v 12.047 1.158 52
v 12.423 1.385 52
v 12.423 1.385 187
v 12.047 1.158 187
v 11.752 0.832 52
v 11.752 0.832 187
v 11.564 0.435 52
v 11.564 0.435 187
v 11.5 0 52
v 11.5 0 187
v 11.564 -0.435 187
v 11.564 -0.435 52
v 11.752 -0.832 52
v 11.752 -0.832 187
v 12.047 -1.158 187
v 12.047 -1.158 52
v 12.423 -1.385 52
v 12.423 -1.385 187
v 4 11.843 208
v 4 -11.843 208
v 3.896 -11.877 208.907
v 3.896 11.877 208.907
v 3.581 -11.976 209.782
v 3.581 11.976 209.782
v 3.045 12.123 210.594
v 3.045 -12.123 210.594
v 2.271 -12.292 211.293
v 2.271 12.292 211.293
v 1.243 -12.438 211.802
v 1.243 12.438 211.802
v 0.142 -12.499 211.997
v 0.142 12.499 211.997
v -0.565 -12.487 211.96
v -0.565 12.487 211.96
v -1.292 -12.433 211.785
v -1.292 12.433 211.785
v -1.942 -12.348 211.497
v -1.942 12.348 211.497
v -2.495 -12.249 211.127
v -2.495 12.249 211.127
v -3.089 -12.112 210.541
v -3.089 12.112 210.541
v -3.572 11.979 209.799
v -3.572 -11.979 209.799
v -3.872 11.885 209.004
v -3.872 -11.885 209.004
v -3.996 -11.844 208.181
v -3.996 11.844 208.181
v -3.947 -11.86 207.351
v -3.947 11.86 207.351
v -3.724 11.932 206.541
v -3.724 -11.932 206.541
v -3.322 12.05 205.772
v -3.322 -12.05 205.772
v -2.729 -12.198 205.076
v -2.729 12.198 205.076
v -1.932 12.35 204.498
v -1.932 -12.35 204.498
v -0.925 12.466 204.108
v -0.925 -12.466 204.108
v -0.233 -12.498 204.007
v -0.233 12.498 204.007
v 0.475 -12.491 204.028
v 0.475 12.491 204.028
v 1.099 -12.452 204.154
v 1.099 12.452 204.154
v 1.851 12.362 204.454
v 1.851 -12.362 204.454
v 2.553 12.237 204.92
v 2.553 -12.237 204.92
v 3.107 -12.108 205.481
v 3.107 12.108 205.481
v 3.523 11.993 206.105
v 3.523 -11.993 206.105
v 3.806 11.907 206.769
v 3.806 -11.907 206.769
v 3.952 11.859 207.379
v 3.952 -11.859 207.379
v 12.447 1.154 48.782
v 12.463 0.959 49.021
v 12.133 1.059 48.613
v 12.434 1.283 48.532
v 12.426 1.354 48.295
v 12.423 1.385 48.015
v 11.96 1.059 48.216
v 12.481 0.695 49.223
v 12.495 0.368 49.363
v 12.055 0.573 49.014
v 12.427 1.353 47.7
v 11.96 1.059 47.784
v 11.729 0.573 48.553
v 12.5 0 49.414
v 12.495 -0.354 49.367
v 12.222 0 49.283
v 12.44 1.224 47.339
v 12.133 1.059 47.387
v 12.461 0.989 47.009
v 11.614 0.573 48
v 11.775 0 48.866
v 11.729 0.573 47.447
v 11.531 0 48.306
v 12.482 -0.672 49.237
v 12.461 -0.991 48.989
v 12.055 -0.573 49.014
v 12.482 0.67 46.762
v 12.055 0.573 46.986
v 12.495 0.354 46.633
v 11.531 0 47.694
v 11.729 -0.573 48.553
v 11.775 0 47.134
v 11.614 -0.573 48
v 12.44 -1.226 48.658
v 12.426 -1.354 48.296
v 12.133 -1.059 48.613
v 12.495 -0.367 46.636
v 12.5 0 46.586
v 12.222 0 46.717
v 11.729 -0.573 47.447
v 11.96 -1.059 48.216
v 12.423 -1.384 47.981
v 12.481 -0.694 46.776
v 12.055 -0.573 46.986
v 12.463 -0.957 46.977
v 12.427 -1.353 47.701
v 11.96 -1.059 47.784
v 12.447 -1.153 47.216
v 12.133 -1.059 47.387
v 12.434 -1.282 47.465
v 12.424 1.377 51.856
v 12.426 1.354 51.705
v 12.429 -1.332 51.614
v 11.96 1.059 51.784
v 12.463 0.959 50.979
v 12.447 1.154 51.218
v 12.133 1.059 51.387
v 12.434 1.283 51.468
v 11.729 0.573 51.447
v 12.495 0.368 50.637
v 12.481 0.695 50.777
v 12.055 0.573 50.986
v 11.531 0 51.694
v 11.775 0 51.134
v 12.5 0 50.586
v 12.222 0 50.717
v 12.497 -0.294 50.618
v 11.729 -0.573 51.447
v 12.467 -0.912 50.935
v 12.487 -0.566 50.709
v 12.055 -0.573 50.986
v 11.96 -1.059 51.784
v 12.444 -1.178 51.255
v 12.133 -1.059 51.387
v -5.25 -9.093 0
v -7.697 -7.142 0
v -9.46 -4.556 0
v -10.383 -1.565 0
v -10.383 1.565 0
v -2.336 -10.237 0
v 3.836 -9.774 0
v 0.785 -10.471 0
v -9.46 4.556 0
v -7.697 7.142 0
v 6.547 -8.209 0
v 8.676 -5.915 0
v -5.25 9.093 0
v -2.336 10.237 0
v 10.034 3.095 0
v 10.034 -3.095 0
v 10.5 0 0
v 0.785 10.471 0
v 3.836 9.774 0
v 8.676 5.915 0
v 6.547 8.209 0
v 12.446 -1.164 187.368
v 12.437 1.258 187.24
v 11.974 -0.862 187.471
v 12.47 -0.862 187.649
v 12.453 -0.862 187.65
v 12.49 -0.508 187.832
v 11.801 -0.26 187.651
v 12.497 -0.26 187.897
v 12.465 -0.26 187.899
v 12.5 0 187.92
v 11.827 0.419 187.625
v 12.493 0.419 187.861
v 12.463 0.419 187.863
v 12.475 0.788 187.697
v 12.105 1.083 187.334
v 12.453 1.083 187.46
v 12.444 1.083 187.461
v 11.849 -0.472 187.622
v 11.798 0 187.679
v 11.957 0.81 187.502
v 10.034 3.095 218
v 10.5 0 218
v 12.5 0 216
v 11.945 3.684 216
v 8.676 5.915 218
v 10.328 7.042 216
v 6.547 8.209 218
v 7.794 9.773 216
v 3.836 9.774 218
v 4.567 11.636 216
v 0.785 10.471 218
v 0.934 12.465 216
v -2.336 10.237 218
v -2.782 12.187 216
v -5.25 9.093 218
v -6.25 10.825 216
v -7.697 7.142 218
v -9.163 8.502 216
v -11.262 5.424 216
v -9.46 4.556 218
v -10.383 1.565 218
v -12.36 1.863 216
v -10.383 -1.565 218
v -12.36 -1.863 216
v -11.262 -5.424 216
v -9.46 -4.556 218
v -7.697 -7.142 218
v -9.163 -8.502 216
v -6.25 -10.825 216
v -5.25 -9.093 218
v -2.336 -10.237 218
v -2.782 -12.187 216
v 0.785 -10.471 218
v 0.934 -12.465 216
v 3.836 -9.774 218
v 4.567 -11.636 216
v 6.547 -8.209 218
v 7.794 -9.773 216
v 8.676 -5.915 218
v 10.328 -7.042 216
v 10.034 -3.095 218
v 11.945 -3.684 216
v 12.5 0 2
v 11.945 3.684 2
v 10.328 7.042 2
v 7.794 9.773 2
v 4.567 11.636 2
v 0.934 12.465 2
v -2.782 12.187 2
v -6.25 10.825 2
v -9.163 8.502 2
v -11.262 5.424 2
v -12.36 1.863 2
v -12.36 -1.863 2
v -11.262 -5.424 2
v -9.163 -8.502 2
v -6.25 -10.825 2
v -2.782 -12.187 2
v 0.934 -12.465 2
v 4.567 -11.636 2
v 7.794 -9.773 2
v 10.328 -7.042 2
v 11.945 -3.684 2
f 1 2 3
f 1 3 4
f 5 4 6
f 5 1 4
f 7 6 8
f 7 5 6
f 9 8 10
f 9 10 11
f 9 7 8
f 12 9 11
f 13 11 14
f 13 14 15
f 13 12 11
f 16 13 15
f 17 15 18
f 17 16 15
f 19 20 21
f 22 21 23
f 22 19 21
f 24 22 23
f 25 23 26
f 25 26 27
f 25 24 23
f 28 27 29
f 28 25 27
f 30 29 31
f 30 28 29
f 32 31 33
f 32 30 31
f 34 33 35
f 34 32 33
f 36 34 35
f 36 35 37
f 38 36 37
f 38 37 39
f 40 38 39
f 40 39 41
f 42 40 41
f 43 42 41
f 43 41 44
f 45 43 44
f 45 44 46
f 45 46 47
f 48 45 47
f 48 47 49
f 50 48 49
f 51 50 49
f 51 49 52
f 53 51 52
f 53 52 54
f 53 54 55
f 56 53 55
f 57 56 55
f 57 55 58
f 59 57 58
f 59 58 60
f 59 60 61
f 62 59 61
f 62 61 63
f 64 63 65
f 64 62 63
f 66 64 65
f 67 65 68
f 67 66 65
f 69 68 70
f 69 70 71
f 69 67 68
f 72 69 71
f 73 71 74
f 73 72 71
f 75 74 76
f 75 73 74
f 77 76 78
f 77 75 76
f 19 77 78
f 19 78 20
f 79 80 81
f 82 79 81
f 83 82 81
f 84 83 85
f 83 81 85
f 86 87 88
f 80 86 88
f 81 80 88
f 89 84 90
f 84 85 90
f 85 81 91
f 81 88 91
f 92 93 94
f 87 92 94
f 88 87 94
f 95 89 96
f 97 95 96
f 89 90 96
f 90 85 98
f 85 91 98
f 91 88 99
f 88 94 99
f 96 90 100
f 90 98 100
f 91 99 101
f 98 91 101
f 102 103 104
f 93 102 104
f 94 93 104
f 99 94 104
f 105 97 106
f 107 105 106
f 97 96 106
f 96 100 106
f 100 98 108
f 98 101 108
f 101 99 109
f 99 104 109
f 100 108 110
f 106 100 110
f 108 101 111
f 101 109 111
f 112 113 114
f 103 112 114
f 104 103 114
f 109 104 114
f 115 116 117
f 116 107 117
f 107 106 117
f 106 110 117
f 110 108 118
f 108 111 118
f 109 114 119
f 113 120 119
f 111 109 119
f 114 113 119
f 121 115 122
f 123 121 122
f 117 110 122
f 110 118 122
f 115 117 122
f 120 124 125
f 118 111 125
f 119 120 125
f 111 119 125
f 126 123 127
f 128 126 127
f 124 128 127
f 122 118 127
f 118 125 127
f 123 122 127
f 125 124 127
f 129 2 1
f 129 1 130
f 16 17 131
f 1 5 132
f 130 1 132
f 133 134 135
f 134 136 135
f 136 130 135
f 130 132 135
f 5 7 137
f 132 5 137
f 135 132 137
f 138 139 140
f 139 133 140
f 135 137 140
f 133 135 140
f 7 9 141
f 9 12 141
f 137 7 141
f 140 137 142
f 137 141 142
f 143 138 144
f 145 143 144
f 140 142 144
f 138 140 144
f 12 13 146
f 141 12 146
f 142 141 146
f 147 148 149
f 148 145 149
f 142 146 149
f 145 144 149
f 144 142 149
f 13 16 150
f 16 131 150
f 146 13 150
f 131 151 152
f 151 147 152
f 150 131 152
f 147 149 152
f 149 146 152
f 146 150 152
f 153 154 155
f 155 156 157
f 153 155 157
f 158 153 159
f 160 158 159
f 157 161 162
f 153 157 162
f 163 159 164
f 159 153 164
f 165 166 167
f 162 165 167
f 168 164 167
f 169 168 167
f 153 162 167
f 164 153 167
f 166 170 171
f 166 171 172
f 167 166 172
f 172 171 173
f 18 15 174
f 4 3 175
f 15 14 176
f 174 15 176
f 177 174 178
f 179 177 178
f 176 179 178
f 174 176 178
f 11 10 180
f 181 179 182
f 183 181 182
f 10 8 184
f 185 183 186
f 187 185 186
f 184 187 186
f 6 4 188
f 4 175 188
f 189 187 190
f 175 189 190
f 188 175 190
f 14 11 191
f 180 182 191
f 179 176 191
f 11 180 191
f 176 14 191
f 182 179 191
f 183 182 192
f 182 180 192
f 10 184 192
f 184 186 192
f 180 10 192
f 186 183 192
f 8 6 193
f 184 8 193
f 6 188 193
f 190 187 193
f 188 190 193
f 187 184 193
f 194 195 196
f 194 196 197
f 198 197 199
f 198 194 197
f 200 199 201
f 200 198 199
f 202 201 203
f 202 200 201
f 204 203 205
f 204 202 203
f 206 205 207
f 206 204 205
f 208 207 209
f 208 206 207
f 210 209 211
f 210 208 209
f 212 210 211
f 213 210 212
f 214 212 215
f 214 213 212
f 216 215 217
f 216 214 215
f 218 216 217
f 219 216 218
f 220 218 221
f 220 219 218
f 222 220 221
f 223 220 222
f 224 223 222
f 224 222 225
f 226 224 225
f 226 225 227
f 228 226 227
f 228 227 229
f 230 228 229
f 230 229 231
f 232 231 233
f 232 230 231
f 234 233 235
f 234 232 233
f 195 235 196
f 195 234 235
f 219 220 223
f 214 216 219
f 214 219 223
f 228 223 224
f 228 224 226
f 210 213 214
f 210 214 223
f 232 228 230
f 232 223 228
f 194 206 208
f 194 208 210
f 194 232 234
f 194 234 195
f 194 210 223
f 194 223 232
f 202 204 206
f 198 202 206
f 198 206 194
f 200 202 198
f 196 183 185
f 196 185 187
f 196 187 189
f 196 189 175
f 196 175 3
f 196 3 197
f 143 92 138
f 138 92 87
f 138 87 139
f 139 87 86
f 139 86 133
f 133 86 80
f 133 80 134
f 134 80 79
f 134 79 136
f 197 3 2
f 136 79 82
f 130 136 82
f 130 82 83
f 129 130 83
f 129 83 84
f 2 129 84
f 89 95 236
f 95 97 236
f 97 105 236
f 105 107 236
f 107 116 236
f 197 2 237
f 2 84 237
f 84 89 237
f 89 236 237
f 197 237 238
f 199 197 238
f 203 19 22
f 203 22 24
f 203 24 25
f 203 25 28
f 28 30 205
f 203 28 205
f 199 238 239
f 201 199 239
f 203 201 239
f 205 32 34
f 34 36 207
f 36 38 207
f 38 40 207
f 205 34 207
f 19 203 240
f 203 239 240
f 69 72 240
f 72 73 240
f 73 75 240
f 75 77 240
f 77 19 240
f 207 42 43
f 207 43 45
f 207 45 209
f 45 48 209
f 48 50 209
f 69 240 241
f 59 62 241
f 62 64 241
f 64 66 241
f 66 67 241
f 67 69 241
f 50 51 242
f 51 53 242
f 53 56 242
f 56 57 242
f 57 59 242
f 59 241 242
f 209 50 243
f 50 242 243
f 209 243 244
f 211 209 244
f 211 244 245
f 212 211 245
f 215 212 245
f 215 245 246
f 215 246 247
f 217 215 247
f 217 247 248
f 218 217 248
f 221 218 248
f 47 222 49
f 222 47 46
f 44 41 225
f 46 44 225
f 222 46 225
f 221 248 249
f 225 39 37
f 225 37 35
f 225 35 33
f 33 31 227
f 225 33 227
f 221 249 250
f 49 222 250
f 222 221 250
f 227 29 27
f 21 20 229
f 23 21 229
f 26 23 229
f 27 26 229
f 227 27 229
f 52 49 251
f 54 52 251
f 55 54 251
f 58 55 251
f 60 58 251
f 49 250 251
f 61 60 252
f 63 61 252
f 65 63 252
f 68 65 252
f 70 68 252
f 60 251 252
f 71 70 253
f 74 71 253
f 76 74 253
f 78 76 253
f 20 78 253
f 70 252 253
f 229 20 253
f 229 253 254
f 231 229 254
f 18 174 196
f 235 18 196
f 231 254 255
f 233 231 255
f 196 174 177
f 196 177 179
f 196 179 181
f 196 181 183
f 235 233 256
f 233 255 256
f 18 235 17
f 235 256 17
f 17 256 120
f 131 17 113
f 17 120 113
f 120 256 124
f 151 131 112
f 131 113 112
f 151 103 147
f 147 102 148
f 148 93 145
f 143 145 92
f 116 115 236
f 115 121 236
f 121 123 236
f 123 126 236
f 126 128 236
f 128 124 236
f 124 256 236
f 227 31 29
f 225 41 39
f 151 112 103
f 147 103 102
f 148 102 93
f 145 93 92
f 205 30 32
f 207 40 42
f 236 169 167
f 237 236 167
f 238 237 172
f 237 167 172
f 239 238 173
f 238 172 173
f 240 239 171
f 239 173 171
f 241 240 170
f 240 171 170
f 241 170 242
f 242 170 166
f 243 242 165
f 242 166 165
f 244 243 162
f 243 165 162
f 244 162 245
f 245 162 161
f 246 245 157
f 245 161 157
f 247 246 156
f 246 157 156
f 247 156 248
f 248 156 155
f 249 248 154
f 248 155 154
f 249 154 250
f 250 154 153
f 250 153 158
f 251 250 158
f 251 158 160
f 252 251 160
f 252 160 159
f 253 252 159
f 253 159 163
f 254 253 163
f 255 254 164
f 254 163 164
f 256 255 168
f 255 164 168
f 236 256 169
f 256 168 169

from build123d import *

# Parameters (mm, degrees)
F0_R     = 12.5
F1_DEPTH = 218
F2_SIZE  = 2
F4_R     = 4
F5_DEPTH = 25.001
F8_DEPTH = 135


with BuildPart() as f1:
    # F0 (on Top) → F1 (new body)
    with BuildSketch(Plane.XY):
        Circle(F0_R)
    extrude(amount=F1_DEPTH)

    # F2
    f2_edges = [f1.edges().sort_by_distance(p)[0] for p in [
        (-12.5, 0, 0),
        (-12.5, 0, 218),
    ]]
    chamfer(f2_edges, length=F2_SIZE)

    # F4 (on offset) → F5 (cut, through all)
    with BuildSketch(Plane.XZ.offset(-12.5)):
        with Locations((0, 208)):
            Circle(F4_R)
    extrude(amount=F5_DEPTH, mode=Mode.SUBTRACT)

    # F7 (on offset) → F8 (cut)
    with BuildSketch(Plane.XY.offset(52)):
        with BuildLine():
            Line((13, -1.5), (13, 1.5))
            ThreePointArc((13, 1.5), (11.5, 0), (13, -1.5))
        make_face()
    extrude(amount=F8_DEPTH, mode=Mode.SUBTRACT)


with BuildPart() as f11:
    # F10 (on offset) → F11 (revolve)
    with BuildSketch(Plane.XY.offset(48)):
        with BuildLine():
            Line((13, -1.5), (13, 1.5))
            ThreePointArc((13, 1.5), (11.5, 0), (13, -1.5))
        make_face()
    revolve(axis=Axis((13, 0, 48), (0, -1, 0)))


with BuildPart() as f1_1:
    add(f1.part)

    # F12: cut F11
    add(f11.part, mode=Mode.SUBTRACT)

    # F7 (on offset) → F13 (revolve, cut)
    with BuildSketch(Plane.XY.offset(52)):
        with BuildLine():
            Line((13, -1.5), (13, 1.5))
            ThreePointArc((13, 1.5), (11.5, 0), (13, -1.5))
        make_face()
    revolve(axis=Axis((13, 0, 52), (0, -1, 0)), mode=Mode.SUBTRACT)

    # F14 (on face) → F15 (revolve, cut)
    with BuildSketch(Plane(origin=(0, 0, 187), x_dir=(1, 0, 0), z_dir=(0, 0, -1))):
        with BuildLine():
            ThreePointArc((12.423077, 1.384615), (11.5, 0), (12.423077, -1.384615))
            Line((12.423077, -1.384615), (12.423077, 1.384615))
        make_face()
    revolve(axis=Axis((12.423077, 0, 187), (0, 1, 0)), mode=Mode.SUBTRACT)


solid = f1_1.part
